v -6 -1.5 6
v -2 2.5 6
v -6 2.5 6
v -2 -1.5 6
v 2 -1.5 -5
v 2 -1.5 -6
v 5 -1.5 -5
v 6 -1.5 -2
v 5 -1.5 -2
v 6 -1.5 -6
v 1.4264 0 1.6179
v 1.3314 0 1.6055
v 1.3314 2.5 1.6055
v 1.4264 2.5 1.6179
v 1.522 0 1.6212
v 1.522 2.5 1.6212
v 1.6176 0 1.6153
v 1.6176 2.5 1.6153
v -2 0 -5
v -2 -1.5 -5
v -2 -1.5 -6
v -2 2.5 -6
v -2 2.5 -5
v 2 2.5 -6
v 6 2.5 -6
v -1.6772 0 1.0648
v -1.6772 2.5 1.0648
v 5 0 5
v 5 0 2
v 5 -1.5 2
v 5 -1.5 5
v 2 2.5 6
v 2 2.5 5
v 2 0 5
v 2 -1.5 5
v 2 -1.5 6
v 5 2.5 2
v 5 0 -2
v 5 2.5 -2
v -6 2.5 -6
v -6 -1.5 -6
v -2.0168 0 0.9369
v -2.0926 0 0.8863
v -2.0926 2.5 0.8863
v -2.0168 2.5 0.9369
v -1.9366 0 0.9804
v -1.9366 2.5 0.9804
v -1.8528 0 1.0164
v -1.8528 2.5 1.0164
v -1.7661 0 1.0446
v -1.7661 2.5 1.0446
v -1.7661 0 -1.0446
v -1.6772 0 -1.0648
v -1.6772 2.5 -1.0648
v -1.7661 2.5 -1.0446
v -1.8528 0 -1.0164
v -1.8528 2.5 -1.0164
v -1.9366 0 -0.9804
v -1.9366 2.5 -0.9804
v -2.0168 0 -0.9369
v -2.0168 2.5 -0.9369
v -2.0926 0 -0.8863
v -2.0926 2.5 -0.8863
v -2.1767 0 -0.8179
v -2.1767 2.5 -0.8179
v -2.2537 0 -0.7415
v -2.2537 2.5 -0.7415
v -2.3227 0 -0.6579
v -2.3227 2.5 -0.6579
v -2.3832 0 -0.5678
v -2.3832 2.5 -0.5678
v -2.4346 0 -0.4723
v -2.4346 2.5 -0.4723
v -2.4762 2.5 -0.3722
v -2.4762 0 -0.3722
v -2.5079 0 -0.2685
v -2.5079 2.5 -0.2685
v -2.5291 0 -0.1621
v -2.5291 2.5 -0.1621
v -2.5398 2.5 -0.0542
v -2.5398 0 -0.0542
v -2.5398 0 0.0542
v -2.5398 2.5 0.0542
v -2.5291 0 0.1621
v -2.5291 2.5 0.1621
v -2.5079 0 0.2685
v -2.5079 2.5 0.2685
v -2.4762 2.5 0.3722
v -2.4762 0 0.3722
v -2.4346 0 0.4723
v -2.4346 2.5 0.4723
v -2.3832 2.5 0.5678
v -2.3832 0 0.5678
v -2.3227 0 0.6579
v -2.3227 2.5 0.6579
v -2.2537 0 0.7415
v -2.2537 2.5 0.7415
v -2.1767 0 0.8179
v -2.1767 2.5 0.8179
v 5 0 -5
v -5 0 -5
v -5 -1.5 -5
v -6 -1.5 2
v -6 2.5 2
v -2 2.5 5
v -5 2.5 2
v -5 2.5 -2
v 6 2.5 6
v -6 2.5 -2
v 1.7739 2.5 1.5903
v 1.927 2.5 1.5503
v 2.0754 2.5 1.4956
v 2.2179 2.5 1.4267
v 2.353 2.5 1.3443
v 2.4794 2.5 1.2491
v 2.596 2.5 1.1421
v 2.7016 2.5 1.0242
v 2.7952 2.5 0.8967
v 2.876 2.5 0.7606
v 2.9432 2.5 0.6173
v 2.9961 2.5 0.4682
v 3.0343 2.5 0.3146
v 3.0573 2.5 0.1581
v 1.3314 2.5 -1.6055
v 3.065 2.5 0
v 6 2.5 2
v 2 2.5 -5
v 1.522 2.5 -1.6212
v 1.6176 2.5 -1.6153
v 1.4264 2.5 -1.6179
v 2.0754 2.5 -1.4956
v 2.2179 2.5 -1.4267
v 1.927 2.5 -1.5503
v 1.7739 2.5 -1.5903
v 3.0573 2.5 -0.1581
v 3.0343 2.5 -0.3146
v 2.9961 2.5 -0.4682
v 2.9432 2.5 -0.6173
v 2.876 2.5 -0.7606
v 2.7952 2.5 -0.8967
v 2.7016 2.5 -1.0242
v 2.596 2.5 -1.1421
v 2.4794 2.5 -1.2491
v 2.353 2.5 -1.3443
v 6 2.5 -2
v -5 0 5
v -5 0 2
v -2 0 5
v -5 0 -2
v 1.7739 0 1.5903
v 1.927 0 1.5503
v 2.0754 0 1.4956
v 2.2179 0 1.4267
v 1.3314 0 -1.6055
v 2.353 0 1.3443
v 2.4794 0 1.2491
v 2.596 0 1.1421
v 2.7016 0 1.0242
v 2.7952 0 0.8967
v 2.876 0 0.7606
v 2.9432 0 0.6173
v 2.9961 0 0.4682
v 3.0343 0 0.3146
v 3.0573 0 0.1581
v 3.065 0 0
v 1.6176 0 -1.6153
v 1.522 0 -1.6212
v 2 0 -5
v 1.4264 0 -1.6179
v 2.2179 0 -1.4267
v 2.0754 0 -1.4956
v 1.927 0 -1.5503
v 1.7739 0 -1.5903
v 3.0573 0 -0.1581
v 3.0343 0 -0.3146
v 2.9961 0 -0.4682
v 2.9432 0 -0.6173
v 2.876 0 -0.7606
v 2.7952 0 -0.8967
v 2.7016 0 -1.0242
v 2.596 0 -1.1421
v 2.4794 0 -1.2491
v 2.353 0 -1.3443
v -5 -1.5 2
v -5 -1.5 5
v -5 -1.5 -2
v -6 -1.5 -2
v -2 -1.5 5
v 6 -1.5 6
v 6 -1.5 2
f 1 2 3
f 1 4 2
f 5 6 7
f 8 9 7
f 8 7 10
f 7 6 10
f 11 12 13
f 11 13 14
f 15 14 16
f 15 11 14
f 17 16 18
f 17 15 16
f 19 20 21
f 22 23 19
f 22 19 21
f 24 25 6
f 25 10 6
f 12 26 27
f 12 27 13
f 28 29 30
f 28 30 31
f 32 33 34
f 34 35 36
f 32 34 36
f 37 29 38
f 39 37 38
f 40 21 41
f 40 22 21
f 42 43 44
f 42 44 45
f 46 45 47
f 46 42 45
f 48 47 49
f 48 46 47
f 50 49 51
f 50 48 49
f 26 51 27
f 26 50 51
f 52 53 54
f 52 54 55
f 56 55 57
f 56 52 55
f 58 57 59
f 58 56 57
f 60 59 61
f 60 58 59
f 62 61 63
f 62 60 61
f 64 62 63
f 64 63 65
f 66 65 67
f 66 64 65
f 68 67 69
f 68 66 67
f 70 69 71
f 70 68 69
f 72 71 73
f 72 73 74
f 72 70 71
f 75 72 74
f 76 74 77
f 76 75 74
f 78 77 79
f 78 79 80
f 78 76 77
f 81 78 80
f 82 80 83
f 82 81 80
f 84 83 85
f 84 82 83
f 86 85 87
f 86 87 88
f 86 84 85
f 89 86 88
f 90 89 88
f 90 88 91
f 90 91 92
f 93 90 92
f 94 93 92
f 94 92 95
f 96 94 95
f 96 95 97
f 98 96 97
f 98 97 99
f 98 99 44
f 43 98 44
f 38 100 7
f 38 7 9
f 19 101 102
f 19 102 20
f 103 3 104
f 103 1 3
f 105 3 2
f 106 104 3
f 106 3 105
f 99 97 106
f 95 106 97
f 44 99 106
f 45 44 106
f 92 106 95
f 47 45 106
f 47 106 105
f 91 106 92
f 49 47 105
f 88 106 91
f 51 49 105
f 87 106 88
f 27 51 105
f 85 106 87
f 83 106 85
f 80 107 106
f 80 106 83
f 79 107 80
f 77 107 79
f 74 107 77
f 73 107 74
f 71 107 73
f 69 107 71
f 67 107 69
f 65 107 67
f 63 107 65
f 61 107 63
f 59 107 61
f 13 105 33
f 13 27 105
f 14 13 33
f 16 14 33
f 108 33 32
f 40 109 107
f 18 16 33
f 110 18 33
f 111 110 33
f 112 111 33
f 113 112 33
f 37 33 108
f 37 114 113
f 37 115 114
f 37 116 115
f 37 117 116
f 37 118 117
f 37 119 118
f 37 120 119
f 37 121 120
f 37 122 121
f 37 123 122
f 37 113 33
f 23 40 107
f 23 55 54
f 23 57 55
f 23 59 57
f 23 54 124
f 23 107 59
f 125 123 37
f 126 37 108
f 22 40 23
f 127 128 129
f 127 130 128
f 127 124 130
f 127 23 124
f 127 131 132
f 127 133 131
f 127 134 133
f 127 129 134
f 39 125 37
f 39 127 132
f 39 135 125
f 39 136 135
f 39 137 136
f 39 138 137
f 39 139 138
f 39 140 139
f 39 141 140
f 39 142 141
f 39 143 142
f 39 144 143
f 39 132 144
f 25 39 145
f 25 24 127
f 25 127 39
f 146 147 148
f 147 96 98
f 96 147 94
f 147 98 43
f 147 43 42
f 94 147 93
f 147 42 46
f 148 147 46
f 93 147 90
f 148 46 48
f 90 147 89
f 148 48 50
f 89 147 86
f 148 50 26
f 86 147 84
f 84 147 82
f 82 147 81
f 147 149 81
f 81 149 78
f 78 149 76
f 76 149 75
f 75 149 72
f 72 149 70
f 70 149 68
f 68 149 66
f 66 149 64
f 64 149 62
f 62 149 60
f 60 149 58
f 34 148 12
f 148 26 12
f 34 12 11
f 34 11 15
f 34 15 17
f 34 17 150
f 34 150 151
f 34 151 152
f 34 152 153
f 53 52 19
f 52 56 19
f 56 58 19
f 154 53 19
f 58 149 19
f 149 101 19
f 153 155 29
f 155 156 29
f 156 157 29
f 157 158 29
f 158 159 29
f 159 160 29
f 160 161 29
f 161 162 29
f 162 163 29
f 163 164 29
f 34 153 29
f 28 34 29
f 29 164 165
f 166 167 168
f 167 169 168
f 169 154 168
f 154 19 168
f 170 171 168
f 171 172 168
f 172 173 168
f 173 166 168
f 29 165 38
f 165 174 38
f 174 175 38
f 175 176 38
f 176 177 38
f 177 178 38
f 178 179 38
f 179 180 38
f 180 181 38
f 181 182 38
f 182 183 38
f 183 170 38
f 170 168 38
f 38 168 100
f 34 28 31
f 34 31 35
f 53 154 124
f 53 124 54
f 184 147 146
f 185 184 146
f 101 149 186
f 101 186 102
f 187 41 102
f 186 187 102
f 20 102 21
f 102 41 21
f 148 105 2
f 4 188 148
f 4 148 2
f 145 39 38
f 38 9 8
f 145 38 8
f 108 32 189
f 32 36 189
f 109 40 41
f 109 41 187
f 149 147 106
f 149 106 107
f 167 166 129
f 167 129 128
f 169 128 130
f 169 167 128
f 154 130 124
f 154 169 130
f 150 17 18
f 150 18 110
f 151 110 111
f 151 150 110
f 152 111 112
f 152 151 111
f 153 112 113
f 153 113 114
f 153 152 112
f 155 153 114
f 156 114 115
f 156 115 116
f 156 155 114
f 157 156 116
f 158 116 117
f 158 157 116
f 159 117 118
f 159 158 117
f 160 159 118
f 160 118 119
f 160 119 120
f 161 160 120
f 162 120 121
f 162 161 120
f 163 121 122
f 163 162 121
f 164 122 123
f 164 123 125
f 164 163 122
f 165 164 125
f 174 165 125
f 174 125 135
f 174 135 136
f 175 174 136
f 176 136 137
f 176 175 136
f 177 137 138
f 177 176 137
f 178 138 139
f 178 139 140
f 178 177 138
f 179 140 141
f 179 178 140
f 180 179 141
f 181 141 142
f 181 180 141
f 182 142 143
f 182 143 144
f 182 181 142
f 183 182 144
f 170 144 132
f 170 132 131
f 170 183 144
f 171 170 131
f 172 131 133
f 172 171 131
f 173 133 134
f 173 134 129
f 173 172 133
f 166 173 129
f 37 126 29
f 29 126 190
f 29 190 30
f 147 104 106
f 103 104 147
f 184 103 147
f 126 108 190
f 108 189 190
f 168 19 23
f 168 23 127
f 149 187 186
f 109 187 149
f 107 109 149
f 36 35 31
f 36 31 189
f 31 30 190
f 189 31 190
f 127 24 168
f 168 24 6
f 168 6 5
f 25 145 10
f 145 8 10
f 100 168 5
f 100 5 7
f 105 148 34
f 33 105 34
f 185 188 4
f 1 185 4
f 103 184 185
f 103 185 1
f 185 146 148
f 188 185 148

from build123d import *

# Parameters (mm, degrees)
SKETCH1_W           = 10
SKETCH1_H           = 10
BOSS_EXTRUDE1_DEPTH = 2.5
BOSS_EXTRUDE2_DEPTH = 2.5
BOSS_EXTRUDE3_DEPTH = 1.5


with BuildPart() as part:
    # Sketch1 → Boss-Extrude1 (new body)
    with BuildSketch(Plane(origin=(0, 0, 0), x_dir=(1, 0, 0), z_dir=(0, 1, 0))):
        Rectangle(SKETCH1_W, SKETCH1_H)
        with BuildLine():
            ThreePointArc((-2.092605578, 0.886322491), (-1.895132853, 0.999347796), (-1.677221968, 1.064808042))
            Line((-1.677221968, 1.064808042), (1.331431871, 1.605489361))
            ThreePointArc((1.331431871, 1.605489361), (1.474163525, 1.620673027), (1.617598637, 1.615265837))
            ThreePointArc((1.617598637, 1.615265837), (3.065, 0), (1.617598637, -1.615265837))
            ThreePointArc((1.617598637, -1.615265837), (1.474163525, -1.620673027), (1.331431871, -1.605489361))
            Line((1.331431871, -1.605489361), (-1.677221968, -1.064808042))
            ThreePointArc((-1.677221968, -1.064808042), (-1.895132853, -0.999347796), (-2.092605578, -0.886322491))
            ThreePointArc((-2.092605578, -0.886322491), (-2.54112078, 0), (-2.092605578, 0.886322491))
        make_face(mode=Mode.SUBTRACT)
    extrude(amount=BOSS_EXTRUDE1_DEPTH)

    # Sketch2 → Boss-Extrude2 (add)
    with BuildSketch(Plane(origin=(0, 0, 0), x_dir=(1, 0, 0), z_dir=(0, 1, 0))):
        Polygon((-2, 6), (-6, 6), (-6, 2), (-5, 2), (-5, 5), (-2, 5), align=None)
        Polygon((2, 6), (2, 5), (5, 5), (5, 2), (6, 2), (6, 6), align=None)
        Polygon((5, -2), (5, -5), (2, -5), (2, -6), (6, -6), (6, -2), align=None)
        Polygon((-6, -2), (-5, -2), (-5, -5), (-2, -5), (-2, -6), (-6, -6), align=None)
    extrude(amount=BOSS_EXTRUDE2_DEPTH)

    # Sketch2<4> → Boss-Extrude3 (add)
    with BuildSketch(Plane(origin=(0, 0, 0), x_dir=(1, 0, 0), z_dir=(0, 1, 0))):
        Polygon((-2, 6), (-6, 6), (-6, 2), (-5, 2), (-5, 5), (-2, 5), align=None)
        Polygon((2, 6), (2, 5), (5, 5), (5, 2), (6, 2), (6, 6), align=None)
        Polygon((5, -2), (5, -5), (2, -5), (2, -6), (6, -6), (6, -2), align=None)
        Polygon((-6, -2), (-5, -2), (-5, -5), (-2, -5), (-2, -6), (-6, -6), align=None)
    extrude(amount=-BOSS_EXTRUDE3_DEPTH)


solid = part.part
